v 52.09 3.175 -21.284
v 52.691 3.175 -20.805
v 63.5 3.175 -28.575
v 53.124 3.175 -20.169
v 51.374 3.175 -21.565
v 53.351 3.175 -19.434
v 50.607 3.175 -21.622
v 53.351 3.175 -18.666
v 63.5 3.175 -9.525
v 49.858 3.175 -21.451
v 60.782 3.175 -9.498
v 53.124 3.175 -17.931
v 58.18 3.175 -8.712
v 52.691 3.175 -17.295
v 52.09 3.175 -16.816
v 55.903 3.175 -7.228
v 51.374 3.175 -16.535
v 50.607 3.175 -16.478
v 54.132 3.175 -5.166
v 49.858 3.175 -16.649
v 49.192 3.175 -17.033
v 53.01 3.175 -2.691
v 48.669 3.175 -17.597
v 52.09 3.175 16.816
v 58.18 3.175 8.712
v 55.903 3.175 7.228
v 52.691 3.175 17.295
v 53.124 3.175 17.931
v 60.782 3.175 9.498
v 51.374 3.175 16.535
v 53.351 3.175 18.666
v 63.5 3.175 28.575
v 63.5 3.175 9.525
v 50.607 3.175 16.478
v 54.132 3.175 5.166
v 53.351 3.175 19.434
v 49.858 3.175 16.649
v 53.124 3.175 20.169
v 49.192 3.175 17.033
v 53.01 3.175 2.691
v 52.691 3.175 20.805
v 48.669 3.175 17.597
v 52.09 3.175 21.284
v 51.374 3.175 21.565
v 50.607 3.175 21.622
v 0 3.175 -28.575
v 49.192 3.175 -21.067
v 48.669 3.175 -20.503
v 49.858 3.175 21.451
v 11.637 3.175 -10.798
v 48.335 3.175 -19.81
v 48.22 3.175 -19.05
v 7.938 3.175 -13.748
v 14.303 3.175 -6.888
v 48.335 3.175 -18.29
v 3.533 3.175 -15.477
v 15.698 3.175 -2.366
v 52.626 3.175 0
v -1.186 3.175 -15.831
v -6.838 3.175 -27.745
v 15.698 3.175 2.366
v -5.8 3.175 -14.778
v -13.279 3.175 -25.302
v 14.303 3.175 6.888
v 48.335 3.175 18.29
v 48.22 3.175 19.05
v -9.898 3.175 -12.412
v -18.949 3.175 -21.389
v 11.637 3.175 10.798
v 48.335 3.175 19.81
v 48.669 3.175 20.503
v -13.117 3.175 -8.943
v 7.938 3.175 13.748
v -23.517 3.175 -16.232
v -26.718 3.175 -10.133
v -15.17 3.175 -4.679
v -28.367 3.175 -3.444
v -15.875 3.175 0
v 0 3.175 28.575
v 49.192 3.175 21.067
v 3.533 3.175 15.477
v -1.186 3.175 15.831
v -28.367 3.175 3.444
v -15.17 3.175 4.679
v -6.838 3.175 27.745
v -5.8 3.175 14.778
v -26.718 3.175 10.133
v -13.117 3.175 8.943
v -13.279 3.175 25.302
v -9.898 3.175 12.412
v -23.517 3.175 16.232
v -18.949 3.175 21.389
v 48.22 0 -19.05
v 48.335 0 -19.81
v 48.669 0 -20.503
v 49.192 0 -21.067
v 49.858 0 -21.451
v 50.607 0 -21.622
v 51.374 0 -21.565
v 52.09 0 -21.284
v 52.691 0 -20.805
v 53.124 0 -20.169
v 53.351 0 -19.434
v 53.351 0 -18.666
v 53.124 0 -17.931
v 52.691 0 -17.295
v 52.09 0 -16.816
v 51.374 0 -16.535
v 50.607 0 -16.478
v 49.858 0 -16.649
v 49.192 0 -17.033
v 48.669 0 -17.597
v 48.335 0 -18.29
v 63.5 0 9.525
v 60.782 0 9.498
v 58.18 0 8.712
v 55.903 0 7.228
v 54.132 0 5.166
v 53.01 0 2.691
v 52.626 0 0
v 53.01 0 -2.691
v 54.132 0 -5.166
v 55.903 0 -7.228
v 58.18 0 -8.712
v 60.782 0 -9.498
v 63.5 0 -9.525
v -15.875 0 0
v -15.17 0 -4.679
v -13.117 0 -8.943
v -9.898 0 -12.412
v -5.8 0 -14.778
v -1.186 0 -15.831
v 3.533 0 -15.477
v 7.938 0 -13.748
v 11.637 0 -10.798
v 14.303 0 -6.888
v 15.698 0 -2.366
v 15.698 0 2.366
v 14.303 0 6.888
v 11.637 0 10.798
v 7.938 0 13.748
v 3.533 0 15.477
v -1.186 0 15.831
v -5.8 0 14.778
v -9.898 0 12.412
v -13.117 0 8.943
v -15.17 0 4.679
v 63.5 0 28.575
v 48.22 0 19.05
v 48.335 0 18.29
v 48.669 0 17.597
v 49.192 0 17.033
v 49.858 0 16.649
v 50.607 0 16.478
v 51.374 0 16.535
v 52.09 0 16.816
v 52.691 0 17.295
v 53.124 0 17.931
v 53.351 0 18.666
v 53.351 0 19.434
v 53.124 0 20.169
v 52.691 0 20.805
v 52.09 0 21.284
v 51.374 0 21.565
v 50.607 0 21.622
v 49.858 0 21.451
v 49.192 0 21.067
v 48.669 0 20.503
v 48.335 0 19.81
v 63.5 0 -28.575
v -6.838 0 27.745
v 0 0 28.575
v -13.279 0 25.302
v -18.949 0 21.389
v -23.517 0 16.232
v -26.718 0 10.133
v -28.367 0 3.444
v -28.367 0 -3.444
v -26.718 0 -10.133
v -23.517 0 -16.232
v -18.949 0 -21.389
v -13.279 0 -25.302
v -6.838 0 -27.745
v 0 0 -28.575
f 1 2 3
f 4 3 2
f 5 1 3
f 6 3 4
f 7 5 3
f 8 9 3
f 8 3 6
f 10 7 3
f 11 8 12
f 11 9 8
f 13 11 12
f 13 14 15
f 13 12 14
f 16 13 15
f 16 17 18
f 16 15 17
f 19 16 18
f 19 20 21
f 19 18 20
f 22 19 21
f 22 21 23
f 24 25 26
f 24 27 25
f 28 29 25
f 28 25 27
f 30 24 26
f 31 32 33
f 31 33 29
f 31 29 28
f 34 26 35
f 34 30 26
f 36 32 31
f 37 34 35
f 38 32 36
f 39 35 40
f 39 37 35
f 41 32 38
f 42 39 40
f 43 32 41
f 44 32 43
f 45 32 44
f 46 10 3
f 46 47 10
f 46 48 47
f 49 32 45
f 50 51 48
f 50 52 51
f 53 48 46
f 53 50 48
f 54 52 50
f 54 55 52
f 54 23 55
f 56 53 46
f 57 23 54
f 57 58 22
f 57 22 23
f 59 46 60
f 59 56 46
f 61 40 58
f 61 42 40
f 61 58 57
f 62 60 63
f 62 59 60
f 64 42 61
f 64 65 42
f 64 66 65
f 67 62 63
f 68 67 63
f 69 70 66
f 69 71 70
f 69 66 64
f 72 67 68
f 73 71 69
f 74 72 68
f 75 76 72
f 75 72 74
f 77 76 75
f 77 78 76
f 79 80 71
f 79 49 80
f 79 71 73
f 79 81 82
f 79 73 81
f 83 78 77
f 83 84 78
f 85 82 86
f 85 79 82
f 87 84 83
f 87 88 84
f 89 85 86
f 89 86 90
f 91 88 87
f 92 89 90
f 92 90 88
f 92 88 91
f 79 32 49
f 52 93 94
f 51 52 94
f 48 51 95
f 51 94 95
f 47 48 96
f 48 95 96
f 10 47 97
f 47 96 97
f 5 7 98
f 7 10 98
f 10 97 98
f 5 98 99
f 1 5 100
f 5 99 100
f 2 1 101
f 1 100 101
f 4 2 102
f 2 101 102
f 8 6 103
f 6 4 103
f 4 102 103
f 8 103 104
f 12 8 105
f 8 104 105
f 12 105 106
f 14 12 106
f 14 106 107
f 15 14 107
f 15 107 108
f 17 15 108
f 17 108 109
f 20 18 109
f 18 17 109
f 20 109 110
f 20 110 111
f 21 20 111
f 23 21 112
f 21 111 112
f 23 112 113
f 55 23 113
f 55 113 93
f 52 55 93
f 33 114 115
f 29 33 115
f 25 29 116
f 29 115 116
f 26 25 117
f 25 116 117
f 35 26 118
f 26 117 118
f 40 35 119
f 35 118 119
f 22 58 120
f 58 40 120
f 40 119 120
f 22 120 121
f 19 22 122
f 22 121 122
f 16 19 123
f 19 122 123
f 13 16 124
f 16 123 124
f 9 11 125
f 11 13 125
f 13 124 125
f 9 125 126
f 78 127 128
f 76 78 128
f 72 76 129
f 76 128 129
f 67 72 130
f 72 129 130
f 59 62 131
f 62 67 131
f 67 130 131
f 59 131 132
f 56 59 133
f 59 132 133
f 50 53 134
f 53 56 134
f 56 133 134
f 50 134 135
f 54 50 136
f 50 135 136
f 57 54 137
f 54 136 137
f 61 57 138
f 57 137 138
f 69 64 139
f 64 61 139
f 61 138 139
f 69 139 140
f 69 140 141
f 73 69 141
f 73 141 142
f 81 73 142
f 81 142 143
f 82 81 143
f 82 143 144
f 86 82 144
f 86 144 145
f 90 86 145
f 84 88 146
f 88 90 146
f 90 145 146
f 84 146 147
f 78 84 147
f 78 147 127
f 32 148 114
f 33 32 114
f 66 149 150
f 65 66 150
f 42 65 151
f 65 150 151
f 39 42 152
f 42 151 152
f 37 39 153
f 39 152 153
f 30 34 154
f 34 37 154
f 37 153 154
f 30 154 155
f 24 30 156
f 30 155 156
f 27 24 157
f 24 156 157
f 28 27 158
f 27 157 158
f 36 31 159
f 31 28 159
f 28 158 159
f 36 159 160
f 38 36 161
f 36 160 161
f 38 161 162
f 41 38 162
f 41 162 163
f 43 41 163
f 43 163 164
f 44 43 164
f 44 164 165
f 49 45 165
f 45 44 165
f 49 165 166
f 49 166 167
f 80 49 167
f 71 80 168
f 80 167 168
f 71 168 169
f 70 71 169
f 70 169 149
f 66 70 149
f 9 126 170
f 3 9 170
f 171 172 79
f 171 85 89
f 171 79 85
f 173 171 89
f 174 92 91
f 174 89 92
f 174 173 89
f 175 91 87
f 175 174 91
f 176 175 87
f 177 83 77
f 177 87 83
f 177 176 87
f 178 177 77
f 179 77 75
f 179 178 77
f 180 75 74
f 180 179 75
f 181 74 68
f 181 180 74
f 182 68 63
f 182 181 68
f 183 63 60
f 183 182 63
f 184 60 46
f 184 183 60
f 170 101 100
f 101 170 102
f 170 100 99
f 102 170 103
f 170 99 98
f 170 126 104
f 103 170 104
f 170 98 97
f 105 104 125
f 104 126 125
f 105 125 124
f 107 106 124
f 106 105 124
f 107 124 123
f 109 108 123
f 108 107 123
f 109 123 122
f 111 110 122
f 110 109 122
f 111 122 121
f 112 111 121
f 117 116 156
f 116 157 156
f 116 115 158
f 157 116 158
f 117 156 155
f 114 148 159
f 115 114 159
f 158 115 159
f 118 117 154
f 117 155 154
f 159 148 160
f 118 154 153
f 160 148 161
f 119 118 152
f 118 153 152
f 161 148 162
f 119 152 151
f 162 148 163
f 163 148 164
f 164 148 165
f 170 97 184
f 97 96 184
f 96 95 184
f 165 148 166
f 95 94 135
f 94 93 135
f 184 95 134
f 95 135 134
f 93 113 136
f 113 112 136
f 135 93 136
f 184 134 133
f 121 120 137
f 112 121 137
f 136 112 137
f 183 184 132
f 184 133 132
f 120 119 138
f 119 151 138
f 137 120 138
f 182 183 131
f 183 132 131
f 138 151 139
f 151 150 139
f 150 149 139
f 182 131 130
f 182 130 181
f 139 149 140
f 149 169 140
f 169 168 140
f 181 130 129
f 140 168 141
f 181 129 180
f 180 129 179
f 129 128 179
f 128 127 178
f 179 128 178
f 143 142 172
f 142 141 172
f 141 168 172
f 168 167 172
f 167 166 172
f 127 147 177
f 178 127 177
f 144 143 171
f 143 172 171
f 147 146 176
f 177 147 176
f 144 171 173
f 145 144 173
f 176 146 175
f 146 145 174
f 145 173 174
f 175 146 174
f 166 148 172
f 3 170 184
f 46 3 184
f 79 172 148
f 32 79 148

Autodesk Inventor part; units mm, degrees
ref_plane "YZ Plane" through (0, 0, 0) normal (1, 0, 0) x (0, 1, 0)
ref_plane "XZ Plane" through (0, 0, 0) normal (0, 1, 0) x (-1, 0, 0)
ref_plane "XY Plane" through (0, 0, 0) normal (0, 0, 1) x (1, 0, 0)
sketch "Sketch1" plane through (0, 0, 0) normal (0, 1, 0) x (-1, 0, 0)
  circle A0 centre (0, 0) radius 15.875
  arc A1 (0, -28.575) -> (0, 28.575) centre (0, 0) ccw
  line L0 (0, 28.575) -> (-63.5, 28.575)
  line L1 (-63.5, -28.575) -> (0, -28.575)
  line L2 (-36.1351, 28.575) -> (-36.1351, 9.525) construction
  line L3 (-36.1351, -28.575) -> (-36.1351, -9.525) construction
  line L4 (-63.5, 28.575) -> (-63.5, 9.525)
  line L5 (-63.5, -9.525) -> (-63.5, -28.575)
  line L6 (-63.5, 19.05) -> (-50.8, 19.05) construction
  line L7 (-63.5, -19.05) -> (-50.8, -19.05) construction
  arc A2 (-63.5, -9.525) -> (-63.5, 9.525) centre (-62.2343, 0) ccw
  circle A3 centre (-50.8, 19.05) radius 2.5797
  circle A4 centre (-50.8, -19.05) radius 2.5797
  dimension "d0" = 31.75
  dimension "d1" = 12.7
  dimension "d2" = 63.5
  dimension "d3" = 19.05
  dimension "d4" = 19.05
  dimension "d5" = 12.7
  dimension "d6" = 63.5
  dimension "d7" = 19.05
  dimension "d8" = 19.05
  dimension "d9" = 5.1594
  dimension "d10" = 5.1594
extrude "Extrusion1" add sketch "Sketch1" along normal blind 3.175
properties part number "motor extension"
